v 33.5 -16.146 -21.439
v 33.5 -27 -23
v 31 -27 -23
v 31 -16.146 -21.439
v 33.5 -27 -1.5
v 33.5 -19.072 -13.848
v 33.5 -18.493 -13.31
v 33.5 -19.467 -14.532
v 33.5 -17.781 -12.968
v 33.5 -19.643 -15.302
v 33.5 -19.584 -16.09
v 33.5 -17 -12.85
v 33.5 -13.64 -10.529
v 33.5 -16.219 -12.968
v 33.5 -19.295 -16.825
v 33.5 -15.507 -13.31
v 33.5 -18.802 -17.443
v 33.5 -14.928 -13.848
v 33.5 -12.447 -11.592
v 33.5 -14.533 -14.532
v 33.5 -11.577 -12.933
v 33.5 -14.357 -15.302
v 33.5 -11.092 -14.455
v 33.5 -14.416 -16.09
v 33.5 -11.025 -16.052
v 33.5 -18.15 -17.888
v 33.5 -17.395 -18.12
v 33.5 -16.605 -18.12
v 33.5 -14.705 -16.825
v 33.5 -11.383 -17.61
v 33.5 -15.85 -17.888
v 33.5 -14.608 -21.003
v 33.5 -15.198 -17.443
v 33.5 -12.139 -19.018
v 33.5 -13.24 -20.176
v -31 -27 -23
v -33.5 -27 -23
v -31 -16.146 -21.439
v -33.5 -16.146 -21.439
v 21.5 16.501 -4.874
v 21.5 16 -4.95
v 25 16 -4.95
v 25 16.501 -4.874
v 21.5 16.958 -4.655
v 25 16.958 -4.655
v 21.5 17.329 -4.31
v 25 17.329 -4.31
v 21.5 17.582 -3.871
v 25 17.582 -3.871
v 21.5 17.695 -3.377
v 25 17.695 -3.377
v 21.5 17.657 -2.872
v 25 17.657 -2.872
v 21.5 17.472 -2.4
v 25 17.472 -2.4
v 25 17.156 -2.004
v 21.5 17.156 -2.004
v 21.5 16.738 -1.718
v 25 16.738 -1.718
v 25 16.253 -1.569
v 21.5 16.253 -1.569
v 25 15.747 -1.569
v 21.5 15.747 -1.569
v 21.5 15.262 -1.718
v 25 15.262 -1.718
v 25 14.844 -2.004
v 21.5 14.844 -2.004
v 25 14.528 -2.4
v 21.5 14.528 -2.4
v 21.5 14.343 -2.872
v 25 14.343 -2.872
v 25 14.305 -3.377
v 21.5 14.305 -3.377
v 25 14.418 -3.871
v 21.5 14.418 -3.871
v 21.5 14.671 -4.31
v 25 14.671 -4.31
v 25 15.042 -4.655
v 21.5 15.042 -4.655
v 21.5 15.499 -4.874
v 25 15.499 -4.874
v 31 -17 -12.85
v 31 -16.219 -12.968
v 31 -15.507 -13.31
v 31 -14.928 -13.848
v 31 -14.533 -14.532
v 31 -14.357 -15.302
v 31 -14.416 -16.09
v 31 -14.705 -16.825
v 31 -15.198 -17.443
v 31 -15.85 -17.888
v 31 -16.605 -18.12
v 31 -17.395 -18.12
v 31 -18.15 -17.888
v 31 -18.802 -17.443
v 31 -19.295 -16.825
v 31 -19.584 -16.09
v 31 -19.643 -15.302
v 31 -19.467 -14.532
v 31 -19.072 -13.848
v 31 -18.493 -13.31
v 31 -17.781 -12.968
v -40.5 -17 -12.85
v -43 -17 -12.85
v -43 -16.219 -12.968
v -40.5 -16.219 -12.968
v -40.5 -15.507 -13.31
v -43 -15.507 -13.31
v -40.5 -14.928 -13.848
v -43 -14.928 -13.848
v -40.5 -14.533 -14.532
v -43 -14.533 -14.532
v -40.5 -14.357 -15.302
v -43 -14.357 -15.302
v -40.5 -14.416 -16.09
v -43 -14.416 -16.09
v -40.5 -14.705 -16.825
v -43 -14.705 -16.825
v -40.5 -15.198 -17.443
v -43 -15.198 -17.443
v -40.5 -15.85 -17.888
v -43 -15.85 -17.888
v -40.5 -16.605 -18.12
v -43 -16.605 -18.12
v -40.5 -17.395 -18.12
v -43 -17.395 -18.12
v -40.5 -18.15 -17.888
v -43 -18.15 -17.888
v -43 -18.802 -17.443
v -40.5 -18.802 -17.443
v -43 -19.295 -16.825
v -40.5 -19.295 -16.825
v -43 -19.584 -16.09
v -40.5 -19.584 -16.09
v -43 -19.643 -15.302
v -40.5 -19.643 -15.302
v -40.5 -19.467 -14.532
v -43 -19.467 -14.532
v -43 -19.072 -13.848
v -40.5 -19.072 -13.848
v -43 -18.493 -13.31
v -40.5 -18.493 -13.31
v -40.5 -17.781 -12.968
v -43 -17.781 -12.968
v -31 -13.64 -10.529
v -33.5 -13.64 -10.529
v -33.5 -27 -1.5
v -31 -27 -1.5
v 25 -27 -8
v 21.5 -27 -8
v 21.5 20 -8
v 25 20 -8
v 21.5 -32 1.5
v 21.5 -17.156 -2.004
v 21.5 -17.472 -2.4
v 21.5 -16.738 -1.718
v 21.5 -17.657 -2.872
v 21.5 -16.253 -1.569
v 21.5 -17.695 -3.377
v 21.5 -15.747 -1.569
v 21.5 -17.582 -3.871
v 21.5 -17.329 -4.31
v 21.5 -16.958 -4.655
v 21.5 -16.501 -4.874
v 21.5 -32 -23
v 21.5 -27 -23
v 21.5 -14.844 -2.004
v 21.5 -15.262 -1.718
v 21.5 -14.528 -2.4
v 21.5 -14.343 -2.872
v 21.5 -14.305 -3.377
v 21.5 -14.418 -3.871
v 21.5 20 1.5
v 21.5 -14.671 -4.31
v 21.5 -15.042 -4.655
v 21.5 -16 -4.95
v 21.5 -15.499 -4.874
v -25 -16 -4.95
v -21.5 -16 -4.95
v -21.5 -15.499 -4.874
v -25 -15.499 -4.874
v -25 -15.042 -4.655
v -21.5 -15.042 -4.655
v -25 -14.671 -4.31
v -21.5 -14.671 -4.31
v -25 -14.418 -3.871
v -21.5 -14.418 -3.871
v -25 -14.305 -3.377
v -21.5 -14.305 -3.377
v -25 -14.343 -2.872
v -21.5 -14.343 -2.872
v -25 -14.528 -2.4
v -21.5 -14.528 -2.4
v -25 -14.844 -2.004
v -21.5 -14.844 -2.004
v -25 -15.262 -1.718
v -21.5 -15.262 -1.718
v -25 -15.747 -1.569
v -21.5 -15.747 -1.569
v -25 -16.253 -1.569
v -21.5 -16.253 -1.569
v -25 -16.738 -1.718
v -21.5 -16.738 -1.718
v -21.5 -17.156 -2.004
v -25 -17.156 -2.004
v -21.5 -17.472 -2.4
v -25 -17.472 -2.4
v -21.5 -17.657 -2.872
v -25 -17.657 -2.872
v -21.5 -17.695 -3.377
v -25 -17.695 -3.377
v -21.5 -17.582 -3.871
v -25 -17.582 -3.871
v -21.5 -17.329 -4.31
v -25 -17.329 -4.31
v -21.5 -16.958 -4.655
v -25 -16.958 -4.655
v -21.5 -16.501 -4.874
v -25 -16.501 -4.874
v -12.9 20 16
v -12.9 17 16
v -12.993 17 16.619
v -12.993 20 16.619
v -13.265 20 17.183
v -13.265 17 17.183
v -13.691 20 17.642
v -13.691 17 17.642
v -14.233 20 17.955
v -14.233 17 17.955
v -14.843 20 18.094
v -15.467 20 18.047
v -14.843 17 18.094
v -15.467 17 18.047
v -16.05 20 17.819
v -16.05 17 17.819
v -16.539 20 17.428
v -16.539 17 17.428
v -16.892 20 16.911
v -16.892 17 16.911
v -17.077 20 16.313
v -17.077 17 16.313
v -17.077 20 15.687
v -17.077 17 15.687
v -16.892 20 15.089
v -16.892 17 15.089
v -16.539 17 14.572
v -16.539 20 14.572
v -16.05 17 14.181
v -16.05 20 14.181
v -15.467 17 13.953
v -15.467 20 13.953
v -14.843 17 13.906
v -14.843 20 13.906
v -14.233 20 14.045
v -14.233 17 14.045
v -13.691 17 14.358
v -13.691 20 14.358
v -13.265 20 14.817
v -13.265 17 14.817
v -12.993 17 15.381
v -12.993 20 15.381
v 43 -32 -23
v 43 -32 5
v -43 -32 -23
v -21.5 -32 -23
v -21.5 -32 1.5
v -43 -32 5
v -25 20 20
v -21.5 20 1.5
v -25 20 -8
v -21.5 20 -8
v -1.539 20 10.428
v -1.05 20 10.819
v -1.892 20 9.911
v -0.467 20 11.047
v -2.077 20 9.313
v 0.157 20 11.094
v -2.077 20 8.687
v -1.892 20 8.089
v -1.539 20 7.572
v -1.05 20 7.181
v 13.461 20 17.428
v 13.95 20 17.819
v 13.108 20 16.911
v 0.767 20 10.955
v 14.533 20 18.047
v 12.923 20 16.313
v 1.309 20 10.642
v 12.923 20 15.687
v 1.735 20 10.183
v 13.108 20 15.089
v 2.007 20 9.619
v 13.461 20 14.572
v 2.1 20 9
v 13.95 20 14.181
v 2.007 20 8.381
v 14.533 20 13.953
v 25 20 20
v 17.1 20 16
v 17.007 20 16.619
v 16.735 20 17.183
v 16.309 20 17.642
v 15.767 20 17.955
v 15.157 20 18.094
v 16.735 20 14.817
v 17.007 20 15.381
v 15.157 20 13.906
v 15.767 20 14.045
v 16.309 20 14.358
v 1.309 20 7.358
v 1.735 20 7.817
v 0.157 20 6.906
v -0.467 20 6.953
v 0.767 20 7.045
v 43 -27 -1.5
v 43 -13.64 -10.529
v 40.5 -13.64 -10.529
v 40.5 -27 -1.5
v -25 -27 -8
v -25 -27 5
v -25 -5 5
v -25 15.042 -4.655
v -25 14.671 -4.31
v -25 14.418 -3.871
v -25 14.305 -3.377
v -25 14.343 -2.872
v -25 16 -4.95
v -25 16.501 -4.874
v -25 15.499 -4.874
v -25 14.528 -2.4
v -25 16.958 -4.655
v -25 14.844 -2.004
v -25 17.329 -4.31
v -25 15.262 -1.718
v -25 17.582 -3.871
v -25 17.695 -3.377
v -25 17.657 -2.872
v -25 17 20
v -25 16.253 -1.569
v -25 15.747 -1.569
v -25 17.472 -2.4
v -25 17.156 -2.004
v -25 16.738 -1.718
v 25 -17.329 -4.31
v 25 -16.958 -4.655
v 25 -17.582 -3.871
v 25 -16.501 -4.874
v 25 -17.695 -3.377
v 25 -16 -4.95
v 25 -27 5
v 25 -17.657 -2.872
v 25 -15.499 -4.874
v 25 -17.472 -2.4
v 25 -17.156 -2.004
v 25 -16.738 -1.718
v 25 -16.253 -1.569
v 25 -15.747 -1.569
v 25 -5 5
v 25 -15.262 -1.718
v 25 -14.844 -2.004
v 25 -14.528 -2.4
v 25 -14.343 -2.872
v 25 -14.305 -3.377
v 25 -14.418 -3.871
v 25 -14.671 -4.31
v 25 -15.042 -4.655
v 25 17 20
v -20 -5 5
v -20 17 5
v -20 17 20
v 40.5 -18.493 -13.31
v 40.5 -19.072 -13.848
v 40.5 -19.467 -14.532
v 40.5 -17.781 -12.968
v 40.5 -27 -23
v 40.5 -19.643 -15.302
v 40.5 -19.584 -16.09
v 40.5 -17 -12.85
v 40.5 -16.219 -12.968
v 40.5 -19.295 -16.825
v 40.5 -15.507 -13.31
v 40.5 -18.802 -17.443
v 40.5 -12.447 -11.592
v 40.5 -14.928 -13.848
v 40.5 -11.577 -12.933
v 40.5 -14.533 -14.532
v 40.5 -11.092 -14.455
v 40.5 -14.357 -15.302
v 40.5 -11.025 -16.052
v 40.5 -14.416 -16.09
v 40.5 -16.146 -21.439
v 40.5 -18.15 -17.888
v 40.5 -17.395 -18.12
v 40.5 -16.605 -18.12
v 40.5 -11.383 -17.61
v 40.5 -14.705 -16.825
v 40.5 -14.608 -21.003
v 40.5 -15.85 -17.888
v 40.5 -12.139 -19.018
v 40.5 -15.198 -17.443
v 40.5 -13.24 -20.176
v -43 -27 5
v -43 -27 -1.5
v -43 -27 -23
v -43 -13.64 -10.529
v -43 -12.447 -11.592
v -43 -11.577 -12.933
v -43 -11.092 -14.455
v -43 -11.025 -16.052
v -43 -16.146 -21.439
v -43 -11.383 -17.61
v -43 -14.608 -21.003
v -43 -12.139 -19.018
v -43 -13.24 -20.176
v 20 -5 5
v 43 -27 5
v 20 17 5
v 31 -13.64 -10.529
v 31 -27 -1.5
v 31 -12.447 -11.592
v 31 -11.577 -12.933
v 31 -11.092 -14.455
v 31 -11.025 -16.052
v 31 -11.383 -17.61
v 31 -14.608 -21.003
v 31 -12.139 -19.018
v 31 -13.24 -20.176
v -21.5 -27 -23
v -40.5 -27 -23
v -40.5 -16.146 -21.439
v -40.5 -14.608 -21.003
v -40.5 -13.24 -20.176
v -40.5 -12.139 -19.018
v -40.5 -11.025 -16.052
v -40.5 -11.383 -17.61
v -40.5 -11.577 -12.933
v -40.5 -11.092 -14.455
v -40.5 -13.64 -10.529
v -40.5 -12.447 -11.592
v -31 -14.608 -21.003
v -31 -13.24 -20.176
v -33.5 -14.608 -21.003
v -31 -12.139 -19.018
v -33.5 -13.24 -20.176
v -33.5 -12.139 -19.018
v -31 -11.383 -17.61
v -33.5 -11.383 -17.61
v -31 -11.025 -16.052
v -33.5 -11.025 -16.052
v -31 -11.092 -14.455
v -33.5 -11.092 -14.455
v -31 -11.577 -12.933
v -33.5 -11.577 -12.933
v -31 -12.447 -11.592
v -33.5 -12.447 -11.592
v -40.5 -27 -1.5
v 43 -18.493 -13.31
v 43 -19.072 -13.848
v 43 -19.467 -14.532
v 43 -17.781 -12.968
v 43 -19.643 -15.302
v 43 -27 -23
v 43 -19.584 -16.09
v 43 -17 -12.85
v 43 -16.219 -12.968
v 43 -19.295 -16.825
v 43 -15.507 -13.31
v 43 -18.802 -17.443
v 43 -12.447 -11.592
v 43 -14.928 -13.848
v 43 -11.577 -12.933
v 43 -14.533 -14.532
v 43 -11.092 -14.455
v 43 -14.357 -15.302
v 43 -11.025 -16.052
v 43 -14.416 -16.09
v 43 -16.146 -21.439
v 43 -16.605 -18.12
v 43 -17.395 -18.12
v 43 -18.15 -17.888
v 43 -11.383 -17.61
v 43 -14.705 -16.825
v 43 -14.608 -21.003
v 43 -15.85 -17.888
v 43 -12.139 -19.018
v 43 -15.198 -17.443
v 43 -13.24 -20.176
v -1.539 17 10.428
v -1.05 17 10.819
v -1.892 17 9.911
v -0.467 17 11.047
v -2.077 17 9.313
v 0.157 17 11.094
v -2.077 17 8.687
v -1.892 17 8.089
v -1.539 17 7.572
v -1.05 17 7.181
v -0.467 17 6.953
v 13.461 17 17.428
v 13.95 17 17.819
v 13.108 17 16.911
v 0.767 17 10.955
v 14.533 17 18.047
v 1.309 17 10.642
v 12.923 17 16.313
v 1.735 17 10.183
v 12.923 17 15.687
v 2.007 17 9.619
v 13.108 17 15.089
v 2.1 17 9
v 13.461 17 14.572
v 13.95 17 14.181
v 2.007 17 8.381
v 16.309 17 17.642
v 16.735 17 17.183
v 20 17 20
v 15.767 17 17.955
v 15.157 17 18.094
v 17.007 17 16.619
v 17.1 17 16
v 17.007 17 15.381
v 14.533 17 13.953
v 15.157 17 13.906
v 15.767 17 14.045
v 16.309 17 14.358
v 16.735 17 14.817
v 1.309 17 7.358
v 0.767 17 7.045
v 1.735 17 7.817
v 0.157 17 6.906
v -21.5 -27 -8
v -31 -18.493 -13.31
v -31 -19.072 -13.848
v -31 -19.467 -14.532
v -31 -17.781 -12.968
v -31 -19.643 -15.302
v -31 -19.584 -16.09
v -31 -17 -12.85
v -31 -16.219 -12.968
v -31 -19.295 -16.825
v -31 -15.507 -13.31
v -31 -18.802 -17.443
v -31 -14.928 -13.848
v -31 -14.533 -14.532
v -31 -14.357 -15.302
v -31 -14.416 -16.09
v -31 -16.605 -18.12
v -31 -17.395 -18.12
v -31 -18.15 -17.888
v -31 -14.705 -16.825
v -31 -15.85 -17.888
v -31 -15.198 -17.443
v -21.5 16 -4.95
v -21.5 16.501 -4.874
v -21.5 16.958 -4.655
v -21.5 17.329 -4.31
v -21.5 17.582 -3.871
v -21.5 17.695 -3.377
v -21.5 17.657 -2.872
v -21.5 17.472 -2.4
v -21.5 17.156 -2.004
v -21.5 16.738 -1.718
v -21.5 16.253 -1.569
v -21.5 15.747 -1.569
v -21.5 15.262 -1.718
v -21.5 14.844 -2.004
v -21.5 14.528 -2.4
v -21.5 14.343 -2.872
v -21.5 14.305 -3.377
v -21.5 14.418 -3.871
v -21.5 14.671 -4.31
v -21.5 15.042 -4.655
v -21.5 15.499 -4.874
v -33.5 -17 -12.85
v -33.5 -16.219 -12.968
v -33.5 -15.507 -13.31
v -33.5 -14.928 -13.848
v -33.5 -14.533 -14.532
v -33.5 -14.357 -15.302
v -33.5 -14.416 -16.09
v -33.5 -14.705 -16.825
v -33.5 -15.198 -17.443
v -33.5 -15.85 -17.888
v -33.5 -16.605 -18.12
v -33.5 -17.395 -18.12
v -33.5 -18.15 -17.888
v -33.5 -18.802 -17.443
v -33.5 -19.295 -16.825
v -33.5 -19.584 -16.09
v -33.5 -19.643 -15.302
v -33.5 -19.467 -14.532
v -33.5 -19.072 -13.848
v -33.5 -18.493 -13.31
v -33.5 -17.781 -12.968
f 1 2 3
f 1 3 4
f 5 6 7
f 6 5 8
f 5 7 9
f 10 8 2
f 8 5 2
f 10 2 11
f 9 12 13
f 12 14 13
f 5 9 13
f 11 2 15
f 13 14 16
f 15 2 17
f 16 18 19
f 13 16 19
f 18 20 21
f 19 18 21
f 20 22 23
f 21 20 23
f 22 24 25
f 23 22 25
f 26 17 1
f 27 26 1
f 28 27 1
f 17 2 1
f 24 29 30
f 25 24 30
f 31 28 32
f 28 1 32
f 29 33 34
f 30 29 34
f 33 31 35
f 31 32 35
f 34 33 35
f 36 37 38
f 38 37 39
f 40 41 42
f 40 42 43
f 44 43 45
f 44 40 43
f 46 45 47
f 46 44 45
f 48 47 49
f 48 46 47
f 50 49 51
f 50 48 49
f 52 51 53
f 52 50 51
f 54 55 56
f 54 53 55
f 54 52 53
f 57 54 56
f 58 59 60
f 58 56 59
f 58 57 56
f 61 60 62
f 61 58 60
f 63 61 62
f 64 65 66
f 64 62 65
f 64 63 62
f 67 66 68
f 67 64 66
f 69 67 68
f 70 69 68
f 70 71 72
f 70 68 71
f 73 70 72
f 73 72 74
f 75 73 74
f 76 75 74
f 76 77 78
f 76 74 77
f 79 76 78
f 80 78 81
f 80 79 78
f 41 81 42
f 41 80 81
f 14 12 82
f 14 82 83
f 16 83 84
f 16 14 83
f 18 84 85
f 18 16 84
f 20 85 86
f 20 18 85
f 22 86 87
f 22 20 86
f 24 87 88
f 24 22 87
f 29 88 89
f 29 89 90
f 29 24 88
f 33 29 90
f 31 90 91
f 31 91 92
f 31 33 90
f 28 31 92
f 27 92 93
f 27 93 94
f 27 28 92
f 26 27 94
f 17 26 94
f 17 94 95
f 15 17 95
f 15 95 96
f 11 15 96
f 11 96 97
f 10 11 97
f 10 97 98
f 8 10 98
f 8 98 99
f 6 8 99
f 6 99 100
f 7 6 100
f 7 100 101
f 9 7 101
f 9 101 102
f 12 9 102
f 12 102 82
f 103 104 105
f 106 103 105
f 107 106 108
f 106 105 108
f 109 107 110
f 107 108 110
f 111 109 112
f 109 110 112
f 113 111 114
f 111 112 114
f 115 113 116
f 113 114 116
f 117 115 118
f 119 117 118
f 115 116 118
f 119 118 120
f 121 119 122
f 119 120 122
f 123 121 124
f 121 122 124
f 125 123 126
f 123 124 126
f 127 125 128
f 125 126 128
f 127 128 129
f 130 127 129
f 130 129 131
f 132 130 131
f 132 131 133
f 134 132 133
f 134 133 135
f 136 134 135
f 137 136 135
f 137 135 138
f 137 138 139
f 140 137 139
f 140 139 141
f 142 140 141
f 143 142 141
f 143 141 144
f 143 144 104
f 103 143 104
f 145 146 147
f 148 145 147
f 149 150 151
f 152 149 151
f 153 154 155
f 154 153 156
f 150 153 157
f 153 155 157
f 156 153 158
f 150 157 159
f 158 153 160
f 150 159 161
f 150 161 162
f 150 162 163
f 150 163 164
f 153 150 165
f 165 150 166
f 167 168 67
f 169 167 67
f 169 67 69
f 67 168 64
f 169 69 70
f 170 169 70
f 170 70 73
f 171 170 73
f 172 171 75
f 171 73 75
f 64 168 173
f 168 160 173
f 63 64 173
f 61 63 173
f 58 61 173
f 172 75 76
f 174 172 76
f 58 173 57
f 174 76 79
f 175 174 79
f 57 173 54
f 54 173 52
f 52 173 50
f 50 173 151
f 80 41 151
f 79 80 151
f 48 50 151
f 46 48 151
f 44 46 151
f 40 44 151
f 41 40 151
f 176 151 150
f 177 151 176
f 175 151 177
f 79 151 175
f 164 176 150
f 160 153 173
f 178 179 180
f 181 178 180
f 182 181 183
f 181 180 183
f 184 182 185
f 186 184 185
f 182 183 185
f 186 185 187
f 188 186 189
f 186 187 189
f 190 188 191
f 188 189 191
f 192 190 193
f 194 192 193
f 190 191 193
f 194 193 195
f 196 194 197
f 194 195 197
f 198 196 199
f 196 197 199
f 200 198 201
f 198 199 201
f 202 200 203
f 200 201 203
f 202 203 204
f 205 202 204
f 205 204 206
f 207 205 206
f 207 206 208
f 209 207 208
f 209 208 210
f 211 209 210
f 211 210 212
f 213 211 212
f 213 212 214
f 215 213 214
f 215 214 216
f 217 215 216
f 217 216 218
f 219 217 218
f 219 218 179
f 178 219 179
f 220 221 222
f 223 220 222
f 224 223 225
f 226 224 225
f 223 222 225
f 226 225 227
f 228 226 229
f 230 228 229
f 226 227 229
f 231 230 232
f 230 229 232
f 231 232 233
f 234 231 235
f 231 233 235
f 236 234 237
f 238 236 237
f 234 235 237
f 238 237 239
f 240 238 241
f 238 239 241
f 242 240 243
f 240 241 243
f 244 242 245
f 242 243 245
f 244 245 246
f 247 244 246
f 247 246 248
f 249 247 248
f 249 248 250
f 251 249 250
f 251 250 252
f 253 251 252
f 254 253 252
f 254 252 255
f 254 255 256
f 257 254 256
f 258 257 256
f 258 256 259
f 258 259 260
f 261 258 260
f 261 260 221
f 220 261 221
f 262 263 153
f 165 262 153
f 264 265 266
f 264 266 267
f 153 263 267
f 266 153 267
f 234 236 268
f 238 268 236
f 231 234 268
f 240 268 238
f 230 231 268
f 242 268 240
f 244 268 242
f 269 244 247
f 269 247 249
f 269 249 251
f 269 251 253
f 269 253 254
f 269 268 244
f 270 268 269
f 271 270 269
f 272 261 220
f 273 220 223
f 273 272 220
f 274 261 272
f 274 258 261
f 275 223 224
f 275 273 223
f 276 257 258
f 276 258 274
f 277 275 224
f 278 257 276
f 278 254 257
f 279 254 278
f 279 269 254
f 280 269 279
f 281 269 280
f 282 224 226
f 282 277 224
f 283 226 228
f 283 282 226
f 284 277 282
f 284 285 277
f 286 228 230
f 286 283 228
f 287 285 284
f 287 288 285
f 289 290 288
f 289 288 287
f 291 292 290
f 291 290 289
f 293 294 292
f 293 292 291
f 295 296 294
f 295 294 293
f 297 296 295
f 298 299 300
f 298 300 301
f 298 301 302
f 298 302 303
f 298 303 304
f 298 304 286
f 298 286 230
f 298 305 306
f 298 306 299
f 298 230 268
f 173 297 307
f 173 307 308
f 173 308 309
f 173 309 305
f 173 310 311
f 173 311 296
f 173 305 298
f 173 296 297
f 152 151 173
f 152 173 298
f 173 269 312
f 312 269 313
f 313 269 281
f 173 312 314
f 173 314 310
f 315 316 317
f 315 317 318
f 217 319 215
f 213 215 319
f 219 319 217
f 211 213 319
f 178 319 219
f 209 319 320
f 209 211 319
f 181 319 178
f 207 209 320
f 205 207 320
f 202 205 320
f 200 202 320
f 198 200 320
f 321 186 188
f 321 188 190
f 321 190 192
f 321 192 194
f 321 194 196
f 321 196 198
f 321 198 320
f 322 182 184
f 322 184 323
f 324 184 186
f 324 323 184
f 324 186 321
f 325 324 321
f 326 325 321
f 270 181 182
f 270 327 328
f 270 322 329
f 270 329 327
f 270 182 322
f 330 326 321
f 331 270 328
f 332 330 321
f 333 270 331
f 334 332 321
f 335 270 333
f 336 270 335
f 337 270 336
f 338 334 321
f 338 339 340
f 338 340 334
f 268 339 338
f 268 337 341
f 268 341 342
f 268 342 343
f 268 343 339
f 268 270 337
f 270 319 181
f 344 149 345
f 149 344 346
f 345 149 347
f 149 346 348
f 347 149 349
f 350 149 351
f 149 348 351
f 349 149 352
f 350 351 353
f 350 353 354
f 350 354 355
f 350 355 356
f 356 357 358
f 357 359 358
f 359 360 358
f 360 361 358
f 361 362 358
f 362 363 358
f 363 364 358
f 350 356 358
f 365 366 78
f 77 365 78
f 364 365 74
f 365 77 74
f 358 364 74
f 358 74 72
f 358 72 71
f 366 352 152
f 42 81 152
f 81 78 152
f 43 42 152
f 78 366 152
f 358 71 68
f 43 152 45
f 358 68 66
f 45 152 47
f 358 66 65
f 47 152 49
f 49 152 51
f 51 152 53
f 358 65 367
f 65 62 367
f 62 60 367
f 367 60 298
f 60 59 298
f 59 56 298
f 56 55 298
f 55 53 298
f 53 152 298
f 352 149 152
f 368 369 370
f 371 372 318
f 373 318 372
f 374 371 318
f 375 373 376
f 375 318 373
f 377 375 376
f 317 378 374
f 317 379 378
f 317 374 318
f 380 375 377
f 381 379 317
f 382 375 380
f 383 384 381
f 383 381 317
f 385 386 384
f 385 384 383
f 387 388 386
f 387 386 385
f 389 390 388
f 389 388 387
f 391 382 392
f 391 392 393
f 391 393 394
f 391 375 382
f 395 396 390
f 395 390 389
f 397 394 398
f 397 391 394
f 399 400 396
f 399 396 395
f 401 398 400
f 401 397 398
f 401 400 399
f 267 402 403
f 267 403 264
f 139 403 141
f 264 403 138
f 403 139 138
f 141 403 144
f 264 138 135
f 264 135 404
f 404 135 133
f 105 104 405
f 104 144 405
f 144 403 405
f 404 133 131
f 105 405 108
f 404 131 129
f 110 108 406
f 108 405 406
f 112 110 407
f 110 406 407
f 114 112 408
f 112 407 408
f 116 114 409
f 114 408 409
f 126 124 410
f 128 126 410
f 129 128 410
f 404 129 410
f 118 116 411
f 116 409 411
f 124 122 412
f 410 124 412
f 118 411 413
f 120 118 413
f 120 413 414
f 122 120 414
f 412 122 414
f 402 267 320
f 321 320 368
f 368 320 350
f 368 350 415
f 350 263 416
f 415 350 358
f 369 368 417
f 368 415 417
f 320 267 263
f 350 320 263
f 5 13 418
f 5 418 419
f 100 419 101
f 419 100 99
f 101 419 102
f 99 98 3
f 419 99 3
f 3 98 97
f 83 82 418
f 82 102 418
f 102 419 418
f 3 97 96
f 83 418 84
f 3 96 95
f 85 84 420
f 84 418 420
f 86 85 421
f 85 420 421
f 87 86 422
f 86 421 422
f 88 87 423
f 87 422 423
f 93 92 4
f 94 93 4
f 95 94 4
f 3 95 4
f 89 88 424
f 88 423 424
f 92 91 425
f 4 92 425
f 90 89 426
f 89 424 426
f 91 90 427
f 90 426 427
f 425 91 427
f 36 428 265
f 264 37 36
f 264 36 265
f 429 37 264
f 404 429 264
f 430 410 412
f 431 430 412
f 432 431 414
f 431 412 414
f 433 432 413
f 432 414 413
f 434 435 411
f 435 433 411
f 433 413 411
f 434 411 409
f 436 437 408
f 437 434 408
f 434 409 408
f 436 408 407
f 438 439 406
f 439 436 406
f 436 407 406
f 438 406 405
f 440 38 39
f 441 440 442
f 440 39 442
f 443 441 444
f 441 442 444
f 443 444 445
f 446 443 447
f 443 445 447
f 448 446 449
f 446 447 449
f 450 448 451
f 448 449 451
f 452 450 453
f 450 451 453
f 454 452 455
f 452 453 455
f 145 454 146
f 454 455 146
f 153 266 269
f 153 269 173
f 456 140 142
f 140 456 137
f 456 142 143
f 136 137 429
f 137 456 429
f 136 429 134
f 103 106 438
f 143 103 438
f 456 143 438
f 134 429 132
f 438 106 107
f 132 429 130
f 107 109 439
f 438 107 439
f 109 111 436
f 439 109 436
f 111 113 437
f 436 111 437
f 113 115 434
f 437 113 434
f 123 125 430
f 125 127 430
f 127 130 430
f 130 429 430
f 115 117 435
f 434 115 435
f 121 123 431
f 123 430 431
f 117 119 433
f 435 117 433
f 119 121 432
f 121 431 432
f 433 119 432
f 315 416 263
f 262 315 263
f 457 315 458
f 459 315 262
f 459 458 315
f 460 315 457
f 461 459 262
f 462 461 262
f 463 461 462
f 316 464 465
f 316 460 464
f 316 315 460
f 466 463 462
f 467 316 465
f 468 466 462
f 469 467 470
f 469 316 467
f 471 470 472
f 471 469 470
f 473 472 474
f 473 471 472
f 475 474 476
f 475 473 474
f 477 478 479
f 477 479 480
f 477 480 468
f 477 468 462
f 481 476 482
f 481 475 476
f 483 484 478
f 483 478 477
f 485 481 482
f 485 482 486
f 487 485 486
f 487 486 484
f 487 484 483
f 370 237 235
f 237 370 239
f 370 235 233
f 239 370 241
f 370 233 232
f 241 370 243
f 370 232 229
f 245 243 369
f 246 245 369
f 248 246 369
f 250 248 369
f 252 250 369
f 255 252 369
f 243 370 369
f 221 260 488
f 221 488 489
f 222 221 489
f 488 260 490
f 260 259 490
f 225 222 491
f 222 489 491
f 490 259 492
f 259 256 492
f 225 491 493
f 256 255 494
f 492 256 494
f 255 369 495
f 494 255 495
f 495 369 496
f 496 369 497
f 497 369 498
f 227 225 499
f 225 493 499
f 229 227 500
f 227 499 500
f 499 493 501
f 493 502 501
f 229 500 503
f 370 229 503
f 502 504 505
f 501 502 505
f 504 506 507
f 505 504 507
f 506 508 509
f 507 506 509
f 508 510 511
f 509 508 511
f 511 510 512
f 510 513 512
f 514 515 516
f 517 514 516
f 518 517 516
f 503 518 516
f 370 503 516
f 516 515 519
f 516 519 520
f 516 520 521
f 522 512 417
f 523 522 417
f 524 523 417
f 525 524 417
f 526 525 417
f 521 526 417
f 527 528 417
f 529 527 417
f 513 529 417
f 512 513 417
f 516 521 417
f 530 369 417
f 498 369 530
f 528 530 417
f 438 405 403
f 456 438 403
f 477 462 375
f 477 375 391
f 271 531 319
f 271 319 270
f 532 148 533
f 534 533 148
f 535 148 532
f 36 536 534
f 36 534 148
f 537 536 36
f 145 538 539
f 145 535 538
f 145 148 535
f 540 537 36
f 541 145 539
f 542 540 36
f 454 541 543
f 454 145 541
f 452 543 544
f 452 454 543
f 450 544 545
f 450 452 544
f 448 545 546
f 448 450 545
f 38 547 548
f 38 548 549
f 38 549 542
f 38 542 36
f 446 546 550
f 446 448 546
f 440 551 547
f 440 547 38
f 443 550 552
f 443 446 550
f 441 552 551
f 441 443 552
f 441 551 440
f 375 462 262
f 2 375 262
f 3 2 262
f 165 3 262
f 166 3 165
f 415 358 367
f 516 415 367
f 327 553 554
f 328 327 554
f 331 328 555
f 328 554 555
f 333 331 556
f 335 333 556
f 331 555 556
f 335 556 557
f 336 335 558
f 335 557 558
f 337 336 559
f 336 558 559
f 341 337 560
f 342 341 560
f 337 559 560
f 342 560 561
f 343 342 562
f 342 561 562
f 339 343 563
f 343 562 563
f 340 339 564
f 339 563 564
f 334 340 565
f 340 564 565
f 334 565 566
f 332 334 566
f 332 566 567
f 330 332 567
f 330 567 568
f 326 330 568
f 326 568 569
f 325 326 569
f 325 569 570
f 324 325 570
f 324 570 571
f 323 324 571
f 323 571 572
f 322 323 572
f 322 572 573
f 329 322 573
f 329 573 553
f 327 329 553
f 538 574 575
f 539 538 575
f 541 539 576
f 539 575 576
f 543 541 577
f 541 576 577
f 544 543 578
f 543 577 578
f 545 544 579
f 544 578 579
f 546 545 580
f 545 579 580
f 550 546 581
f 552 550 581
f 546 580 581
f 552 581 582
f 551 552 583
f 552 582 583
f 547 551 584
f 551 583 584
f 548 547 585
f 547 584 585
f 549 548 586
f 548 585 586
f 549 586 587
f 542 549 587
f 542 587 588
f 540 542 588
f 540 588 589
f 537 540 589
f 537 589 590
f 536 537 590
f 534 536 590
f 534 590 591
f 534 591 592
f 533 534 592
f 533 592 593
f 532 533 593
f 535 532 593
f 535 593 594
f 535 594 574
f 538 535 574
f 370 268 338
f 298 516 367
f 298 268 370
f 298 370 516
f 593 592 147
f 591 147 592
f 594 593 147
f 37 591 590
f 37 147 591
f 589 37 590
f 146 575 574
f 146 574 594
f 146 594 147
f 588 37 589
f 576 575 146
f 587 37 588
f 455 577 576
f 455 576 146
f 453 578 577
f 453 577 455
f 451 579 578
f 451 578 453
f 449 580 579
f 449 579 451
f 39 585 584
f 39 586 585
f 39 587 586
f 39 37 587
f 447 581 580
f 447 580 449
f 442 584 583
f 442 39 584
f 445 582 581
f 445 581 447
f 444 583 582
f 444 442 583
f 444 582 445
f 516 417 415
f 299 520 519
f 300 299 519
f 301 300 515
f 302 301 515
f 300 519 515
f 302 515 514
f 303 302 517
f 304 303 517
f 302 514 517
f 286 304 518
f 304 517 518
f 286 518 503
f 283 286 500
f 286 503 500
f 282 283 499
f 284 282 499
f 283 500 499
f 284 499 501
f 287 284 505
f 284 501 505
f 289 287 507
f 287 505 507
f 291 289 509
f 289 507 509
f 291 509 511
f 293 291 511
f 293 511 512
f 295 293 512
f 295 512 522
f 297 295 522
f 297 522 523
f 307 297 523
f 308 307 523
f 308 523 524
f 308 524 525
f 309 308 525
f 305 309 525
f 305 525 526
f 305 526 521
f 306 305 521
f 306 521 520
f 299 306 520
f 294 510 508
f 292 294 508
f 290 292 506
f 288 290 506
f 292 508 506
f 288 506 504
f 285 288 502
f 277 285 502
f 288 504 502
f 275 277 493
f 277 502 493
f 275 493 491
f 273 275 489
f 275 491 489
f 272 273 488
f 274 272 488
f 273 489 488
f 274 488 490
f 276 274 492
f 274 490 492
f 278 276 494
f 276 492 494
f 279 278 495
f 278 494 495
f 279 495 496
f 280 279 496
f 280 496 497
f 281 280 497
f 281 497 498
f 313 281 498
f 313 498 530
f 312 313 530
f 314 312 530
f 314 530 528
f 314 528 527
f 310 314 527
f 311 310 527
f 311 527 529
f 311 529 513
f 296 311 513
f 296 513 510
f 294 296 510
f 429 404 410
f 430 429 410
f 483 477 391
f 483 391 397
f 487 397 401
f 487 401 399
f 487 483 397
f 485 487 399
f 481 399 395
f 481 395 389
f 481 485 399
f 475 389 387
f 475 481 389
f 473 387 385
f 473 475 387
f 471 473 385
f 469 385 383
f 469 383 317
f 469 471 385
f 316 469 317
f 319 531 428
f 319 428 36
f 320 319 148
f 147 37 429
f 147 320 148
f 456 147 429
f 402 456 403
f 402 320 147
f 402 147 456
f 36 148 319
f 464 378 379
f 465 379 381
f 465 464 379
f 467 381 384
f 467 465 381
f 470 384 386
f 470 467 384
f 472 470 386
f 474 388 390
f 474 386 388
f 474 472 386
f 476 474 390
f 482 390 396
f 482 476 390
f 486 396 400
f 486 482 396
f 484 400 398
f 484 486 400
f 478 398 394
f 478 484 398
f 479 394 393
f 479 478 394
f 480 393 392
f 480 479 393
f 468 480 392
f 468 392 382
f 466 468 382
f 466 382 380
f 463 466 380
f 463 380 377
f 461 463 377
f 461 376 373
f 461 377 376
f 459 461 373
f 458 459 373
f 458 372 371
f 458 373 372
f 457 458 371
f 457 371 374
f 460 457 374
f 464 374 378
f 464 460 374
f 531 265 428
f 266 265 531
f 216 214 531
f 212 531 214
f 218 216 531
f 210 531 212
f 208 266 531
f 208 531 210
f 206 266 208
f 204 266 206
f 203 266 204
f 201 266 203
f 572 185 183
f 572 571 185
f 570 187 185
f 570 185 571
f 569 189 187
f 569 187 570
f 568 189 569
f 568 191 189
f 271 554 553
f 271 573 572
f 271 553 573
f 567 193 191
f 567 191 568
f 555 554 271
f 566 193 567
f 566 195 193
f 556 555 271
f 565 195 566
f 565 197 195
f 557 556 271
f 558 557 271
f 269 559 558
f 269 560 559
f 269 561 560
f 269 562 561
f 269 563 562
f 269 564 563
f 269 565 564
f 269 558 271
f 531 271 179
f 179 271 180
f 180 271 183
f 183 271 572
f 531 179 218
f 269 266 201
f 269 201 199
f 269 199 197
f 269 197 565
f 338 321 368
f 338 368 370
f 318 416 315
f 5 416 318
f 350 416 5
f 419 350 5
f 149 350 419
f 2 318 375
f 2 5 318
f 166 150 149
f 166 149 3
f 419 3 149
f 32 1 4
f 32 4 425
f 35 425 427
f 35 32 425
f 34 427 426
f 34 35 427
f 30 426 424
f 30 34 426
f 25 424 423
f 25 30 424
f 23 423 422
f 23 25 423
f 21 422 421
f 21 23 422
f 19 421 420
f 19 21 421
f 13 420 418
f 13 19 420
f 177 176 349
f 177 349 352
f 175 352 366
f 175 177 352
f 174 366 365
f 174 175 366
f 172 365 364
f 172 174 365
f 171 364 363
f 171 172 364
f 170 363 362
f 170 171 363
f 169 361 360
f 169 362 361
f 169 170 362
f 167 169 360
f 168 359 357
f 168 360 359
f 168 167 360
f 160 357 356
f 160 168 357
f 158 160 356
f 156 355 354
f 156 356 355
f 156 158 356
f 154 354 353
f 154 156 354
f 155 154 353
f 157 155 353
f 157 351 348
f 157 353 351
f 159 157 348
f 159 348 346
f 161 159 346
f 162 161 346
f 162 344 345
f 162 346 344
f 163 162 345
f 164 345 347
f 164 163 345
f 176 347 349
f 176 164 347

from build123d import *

# Parameters (mm, degrees)
SKETCH_1_W               = 50
SKETCH_1_H               = 40
EXTRUDE_1_DEPTH          = 5
SKETCH_2_W               = 6
SKETCH_2_H               = 40
EXTRUDE_2_DEPTH          = 8
SKETCH_4_W               = 38
SKETCH_4_H               = 40
CUT_EXTRUDE_2_DEPTH      = 1.5
SKETCH_6_R               = 1.7
CUT_EXTRUDE_3_DEPTH      = 45
CUT_EXTRUDE_3_DEPTH_BACK = 7
SKETCH_7_W               = 43
SKETCH_7_H               = 9.5
CUT_EXTRUDE_4_DEPTH      = 41
SKETCH_8_W               = 50
SKETCH_8_H               = 3
EXTRUDE_4_DEPTH          = 15
SKETCH_9_R               = 2.1
CUT_EXTRUDE_5_DEPTH      = 4
EXTRUDE_5_DEPTH          = 12
SKETCH_11_W              = 13
SKETCH_11_H              = 5
EXTRUDE_6_DEPTH          = 18
SKETCH_12_W              = 13
SKETCH_12_H              = 5
EXTRUDE_7_DEPTH          = 18
SKETCH_13_W              = 21.5
SKETCH_13_H              = 5
EXTRUDE_8_DEPTH          = 15
EXTRUDE_11_DEPTH         = 5
EXTRUDE_12_DEPTH         = 5
SKETCH_20_R              = 2.65
EXTRUDE_13_DEPTH         = 12
SKETCH_21_W              = 7
SKETCH_21_H              = 34.173261611
CUT_EXTRUDE_8_DEPTH      = 44


with BuildPart() as part:
    # 草图1 → 凸台-拉伸1 (new body)
    with BuildSketch(Plane.XY):
        Rectangle(SKETCH_1_W, SKETCH_1_H)
    extrude(amount=EXTRUDE_1_DEPTH)

    # 草图2 → 凸台-拉伸2 (add)
    with BuildSketch(Plane(origin=(0, 0, 0), x_dir=(-1, 0, 0), z_dir=(0, 0, -1))):
        with Locations((-22, 0)):
            Rectangle(SKETCH_2_W, SKETCH_2_H)
        with Locations((22, 0)):
            Rectangle(SKETCH_2_W, SKETCH_2_H)
    extrude(amount=EXTRUDE_2_DEPTH)

    # 草图4 → 切除-拉伸2 (cut)
    with BuildSketch(Plane(origin=(0, 0, 0), x_dir=(-1, 0, 0), z_dir=(0, 0, -1))):
        Rectangle(SKETCH_4_W, SKETCH_4_H)
    extrude(amount=-CUT_EXTRUDE_2_DEPTH, mode=Mode.SUBTRACT)

    # 草图6 → 切除-拉伸3 (cut, two sides)
    with BuildSketch(Plane(origin=(-19, 0, 0), x_dir=(0, 0, -1), z_dir=(1, 0, 0))) as cut_extrude_3_sk:
        with Locations((3.25, 16)):
            Circle(SKETCH_6_R)
        with Locations((3.25, -16)):
            Circle(SKETCH_6_R)
    extrude(amount=CUT_EXTRUDE_3_DEPTH, mode=Mode.SUBTRACT)
    extrude(cut_extrude_3_sk.sketch, amount=-CUT_EXTRUDE_3_DEPTH_BACK, mode=Mode.SUBTRACT)

    # 草图7 → 切除-拉伸4 (cut, through all)
    with BuildSketch(Plane.XZ.offset(20)):
        with Locations((0, -3.25)):
            Rectangle(SKETCH_7_W, SKETCH_7_H)
    extrude(amount=-CUT_EXTRUDE_4_DEPTH, mode=Mode.SUBTRACT)

    # 草图8 → 凸台-拉伸4 (add)
    with BuildSketch(Plane.XY.offset(5)):
        with Locations((0, 18.5)):
            Rectangle(SKETCH_8_W, SKETCH_8_H)
    extrude(amount=EXTRUDE_4_DEPTH)

    # 草图9 → 切除-拉伸5 (cut, through all)
    with BuildSketch(Plane.XZ.offset(-17)):
        with Locations((-15, 16)):
            Circle(SKETCH_9_R)
        with Locations((15, 16)):
            Circle(SKETCH_9_R)
        with Locations((0, 9)):
            Circle(SKETCH_9_R)
    extrude(amount=-CUT_EXTRUDE_5_DEPTH, mode=Mode.SUBTRACT)

    # 草图10 → 凸台-拉伸5 (add)
    with BuildSketch(Plane.XZ.offset(20)):
        Polygon((-25, -8), (-21.5, -8), (-21.5, 1.5), (21.5, 1.5), (21.5, -8), (25, -8), (25, 5), (-25, 5), align=None)
    extrude(amount=EXTRUDE_5_DEPTH)

    # 草图11 → 凸台-拉伸6 (add)
    with BuildSketch(Plane(origin=(25, 0, 0), x_dir=(0, 0, -1), z_dir=(1, 0, 0))):
        with Locations((1.5, -29.5)):
            Rectangle(SKETCH_11_W, SKETCH_11_H)
    extrude(amount=EXTRUDE_6_DEPTH)

    # 草图12 → 凸台-拉伸7 (add)
    with BuildSketch(Plane.ZY.offset(25)):
        with Locations((-1.5, -29.5)):
            Rectangle(SKETCH_12_W, SKETCH_12_H)
    extrude(amount=EXTRUDE_7_DEPTH)

    # 草图13 → 凸台-拉伸8 (add)
    with BuildSketch(Plane(origin=(0, 0, -8), x_dir=(-1, 0, 0), z_dir=(0, 0, -1))):
        with Locations((32.25, -29.5)):
            Rectangle(SKETCH_13_W, SKETCH_13_H)
        with Locations((-32.25, -29.5)):
            Rectangle(SKETCH_13_W, SKETCH_13_H)
    extrude(amount=EXTRUDE_8_DEPTH)

    # 草图18 → 凸台-拉伸11 (add)
    with BuildSketch(Plane.ZY.offset(25)):
        Polygon((5, -5), (20, 17), (5, 17), align=None)
    extrude(amount=-EXTRUDE_11_DEPTH)

    # 草图19 → 凸台-拉伸12 (add)
    with BuildSketch(Plane(origin=(25, 0, 0), x_dir=(0, 0, -1), z_dir=(1, 0, 0))):
        Polygon((-5, 17), (-5, -5), (-20, 17), align=None)
    extrude(amount=-EXTRUDE_12_DEPTH)

    # 草图20 → 凸台-拉伸13 (add)
    with BuildSketch(Plane.ZY.offset(43)):
        with BuildLine():
            Line((-23, -27), (-21.438888742, -16.145833443))
            ThreePointArc((-21.438888742, -16.145833443), (-16.842939484, -11.152221487), (-10.528814426, -13.640340197))
            Line((-10.528814426, -13.640340197), (-1.5, -27))
            Line((-1.5, -27), (-23, -27))
        make_face()
        with Locations((-15.5, -17)):
            Circle(SKETCH_20_R, mode=Mode.SUBTRACT)
    extrude_13 = extrude(amount=-EXTRUDE_13_DEPTH)

    # 草图21 → 切除-拉伸8 (cut, through all)
    with BuildSketch(Plane(origin=(0, 0, -23), x_dir=(-1, 0, 0), z_dir=(0, 0, -1))):
        with Locations((37, -9.913369194)):
            Rectangle(SKETCH_21_W, SKETCH_21_H)
    cut_extrude_8 = extrude(amount=-CUT_EXTRUDE_8_DEPTH, mode=Mode.SUBTRACT)

    # 镜向3: 凸台-拉伸13, 切除-拉伸8 across plane
    add(extrude_13.mirror(Plane(origin=(0, 0, 0), x_dir=(0, 0, 1), z_dir=(1, 0, 0))))
    add(cut_extrude_8.mirror(Plane(origin=(0, 0, 0), x_dir=(0, 0, 1), z_dir=(1, 0, 0))), mode=Mode.SUBTRACT)


solid = part.part
